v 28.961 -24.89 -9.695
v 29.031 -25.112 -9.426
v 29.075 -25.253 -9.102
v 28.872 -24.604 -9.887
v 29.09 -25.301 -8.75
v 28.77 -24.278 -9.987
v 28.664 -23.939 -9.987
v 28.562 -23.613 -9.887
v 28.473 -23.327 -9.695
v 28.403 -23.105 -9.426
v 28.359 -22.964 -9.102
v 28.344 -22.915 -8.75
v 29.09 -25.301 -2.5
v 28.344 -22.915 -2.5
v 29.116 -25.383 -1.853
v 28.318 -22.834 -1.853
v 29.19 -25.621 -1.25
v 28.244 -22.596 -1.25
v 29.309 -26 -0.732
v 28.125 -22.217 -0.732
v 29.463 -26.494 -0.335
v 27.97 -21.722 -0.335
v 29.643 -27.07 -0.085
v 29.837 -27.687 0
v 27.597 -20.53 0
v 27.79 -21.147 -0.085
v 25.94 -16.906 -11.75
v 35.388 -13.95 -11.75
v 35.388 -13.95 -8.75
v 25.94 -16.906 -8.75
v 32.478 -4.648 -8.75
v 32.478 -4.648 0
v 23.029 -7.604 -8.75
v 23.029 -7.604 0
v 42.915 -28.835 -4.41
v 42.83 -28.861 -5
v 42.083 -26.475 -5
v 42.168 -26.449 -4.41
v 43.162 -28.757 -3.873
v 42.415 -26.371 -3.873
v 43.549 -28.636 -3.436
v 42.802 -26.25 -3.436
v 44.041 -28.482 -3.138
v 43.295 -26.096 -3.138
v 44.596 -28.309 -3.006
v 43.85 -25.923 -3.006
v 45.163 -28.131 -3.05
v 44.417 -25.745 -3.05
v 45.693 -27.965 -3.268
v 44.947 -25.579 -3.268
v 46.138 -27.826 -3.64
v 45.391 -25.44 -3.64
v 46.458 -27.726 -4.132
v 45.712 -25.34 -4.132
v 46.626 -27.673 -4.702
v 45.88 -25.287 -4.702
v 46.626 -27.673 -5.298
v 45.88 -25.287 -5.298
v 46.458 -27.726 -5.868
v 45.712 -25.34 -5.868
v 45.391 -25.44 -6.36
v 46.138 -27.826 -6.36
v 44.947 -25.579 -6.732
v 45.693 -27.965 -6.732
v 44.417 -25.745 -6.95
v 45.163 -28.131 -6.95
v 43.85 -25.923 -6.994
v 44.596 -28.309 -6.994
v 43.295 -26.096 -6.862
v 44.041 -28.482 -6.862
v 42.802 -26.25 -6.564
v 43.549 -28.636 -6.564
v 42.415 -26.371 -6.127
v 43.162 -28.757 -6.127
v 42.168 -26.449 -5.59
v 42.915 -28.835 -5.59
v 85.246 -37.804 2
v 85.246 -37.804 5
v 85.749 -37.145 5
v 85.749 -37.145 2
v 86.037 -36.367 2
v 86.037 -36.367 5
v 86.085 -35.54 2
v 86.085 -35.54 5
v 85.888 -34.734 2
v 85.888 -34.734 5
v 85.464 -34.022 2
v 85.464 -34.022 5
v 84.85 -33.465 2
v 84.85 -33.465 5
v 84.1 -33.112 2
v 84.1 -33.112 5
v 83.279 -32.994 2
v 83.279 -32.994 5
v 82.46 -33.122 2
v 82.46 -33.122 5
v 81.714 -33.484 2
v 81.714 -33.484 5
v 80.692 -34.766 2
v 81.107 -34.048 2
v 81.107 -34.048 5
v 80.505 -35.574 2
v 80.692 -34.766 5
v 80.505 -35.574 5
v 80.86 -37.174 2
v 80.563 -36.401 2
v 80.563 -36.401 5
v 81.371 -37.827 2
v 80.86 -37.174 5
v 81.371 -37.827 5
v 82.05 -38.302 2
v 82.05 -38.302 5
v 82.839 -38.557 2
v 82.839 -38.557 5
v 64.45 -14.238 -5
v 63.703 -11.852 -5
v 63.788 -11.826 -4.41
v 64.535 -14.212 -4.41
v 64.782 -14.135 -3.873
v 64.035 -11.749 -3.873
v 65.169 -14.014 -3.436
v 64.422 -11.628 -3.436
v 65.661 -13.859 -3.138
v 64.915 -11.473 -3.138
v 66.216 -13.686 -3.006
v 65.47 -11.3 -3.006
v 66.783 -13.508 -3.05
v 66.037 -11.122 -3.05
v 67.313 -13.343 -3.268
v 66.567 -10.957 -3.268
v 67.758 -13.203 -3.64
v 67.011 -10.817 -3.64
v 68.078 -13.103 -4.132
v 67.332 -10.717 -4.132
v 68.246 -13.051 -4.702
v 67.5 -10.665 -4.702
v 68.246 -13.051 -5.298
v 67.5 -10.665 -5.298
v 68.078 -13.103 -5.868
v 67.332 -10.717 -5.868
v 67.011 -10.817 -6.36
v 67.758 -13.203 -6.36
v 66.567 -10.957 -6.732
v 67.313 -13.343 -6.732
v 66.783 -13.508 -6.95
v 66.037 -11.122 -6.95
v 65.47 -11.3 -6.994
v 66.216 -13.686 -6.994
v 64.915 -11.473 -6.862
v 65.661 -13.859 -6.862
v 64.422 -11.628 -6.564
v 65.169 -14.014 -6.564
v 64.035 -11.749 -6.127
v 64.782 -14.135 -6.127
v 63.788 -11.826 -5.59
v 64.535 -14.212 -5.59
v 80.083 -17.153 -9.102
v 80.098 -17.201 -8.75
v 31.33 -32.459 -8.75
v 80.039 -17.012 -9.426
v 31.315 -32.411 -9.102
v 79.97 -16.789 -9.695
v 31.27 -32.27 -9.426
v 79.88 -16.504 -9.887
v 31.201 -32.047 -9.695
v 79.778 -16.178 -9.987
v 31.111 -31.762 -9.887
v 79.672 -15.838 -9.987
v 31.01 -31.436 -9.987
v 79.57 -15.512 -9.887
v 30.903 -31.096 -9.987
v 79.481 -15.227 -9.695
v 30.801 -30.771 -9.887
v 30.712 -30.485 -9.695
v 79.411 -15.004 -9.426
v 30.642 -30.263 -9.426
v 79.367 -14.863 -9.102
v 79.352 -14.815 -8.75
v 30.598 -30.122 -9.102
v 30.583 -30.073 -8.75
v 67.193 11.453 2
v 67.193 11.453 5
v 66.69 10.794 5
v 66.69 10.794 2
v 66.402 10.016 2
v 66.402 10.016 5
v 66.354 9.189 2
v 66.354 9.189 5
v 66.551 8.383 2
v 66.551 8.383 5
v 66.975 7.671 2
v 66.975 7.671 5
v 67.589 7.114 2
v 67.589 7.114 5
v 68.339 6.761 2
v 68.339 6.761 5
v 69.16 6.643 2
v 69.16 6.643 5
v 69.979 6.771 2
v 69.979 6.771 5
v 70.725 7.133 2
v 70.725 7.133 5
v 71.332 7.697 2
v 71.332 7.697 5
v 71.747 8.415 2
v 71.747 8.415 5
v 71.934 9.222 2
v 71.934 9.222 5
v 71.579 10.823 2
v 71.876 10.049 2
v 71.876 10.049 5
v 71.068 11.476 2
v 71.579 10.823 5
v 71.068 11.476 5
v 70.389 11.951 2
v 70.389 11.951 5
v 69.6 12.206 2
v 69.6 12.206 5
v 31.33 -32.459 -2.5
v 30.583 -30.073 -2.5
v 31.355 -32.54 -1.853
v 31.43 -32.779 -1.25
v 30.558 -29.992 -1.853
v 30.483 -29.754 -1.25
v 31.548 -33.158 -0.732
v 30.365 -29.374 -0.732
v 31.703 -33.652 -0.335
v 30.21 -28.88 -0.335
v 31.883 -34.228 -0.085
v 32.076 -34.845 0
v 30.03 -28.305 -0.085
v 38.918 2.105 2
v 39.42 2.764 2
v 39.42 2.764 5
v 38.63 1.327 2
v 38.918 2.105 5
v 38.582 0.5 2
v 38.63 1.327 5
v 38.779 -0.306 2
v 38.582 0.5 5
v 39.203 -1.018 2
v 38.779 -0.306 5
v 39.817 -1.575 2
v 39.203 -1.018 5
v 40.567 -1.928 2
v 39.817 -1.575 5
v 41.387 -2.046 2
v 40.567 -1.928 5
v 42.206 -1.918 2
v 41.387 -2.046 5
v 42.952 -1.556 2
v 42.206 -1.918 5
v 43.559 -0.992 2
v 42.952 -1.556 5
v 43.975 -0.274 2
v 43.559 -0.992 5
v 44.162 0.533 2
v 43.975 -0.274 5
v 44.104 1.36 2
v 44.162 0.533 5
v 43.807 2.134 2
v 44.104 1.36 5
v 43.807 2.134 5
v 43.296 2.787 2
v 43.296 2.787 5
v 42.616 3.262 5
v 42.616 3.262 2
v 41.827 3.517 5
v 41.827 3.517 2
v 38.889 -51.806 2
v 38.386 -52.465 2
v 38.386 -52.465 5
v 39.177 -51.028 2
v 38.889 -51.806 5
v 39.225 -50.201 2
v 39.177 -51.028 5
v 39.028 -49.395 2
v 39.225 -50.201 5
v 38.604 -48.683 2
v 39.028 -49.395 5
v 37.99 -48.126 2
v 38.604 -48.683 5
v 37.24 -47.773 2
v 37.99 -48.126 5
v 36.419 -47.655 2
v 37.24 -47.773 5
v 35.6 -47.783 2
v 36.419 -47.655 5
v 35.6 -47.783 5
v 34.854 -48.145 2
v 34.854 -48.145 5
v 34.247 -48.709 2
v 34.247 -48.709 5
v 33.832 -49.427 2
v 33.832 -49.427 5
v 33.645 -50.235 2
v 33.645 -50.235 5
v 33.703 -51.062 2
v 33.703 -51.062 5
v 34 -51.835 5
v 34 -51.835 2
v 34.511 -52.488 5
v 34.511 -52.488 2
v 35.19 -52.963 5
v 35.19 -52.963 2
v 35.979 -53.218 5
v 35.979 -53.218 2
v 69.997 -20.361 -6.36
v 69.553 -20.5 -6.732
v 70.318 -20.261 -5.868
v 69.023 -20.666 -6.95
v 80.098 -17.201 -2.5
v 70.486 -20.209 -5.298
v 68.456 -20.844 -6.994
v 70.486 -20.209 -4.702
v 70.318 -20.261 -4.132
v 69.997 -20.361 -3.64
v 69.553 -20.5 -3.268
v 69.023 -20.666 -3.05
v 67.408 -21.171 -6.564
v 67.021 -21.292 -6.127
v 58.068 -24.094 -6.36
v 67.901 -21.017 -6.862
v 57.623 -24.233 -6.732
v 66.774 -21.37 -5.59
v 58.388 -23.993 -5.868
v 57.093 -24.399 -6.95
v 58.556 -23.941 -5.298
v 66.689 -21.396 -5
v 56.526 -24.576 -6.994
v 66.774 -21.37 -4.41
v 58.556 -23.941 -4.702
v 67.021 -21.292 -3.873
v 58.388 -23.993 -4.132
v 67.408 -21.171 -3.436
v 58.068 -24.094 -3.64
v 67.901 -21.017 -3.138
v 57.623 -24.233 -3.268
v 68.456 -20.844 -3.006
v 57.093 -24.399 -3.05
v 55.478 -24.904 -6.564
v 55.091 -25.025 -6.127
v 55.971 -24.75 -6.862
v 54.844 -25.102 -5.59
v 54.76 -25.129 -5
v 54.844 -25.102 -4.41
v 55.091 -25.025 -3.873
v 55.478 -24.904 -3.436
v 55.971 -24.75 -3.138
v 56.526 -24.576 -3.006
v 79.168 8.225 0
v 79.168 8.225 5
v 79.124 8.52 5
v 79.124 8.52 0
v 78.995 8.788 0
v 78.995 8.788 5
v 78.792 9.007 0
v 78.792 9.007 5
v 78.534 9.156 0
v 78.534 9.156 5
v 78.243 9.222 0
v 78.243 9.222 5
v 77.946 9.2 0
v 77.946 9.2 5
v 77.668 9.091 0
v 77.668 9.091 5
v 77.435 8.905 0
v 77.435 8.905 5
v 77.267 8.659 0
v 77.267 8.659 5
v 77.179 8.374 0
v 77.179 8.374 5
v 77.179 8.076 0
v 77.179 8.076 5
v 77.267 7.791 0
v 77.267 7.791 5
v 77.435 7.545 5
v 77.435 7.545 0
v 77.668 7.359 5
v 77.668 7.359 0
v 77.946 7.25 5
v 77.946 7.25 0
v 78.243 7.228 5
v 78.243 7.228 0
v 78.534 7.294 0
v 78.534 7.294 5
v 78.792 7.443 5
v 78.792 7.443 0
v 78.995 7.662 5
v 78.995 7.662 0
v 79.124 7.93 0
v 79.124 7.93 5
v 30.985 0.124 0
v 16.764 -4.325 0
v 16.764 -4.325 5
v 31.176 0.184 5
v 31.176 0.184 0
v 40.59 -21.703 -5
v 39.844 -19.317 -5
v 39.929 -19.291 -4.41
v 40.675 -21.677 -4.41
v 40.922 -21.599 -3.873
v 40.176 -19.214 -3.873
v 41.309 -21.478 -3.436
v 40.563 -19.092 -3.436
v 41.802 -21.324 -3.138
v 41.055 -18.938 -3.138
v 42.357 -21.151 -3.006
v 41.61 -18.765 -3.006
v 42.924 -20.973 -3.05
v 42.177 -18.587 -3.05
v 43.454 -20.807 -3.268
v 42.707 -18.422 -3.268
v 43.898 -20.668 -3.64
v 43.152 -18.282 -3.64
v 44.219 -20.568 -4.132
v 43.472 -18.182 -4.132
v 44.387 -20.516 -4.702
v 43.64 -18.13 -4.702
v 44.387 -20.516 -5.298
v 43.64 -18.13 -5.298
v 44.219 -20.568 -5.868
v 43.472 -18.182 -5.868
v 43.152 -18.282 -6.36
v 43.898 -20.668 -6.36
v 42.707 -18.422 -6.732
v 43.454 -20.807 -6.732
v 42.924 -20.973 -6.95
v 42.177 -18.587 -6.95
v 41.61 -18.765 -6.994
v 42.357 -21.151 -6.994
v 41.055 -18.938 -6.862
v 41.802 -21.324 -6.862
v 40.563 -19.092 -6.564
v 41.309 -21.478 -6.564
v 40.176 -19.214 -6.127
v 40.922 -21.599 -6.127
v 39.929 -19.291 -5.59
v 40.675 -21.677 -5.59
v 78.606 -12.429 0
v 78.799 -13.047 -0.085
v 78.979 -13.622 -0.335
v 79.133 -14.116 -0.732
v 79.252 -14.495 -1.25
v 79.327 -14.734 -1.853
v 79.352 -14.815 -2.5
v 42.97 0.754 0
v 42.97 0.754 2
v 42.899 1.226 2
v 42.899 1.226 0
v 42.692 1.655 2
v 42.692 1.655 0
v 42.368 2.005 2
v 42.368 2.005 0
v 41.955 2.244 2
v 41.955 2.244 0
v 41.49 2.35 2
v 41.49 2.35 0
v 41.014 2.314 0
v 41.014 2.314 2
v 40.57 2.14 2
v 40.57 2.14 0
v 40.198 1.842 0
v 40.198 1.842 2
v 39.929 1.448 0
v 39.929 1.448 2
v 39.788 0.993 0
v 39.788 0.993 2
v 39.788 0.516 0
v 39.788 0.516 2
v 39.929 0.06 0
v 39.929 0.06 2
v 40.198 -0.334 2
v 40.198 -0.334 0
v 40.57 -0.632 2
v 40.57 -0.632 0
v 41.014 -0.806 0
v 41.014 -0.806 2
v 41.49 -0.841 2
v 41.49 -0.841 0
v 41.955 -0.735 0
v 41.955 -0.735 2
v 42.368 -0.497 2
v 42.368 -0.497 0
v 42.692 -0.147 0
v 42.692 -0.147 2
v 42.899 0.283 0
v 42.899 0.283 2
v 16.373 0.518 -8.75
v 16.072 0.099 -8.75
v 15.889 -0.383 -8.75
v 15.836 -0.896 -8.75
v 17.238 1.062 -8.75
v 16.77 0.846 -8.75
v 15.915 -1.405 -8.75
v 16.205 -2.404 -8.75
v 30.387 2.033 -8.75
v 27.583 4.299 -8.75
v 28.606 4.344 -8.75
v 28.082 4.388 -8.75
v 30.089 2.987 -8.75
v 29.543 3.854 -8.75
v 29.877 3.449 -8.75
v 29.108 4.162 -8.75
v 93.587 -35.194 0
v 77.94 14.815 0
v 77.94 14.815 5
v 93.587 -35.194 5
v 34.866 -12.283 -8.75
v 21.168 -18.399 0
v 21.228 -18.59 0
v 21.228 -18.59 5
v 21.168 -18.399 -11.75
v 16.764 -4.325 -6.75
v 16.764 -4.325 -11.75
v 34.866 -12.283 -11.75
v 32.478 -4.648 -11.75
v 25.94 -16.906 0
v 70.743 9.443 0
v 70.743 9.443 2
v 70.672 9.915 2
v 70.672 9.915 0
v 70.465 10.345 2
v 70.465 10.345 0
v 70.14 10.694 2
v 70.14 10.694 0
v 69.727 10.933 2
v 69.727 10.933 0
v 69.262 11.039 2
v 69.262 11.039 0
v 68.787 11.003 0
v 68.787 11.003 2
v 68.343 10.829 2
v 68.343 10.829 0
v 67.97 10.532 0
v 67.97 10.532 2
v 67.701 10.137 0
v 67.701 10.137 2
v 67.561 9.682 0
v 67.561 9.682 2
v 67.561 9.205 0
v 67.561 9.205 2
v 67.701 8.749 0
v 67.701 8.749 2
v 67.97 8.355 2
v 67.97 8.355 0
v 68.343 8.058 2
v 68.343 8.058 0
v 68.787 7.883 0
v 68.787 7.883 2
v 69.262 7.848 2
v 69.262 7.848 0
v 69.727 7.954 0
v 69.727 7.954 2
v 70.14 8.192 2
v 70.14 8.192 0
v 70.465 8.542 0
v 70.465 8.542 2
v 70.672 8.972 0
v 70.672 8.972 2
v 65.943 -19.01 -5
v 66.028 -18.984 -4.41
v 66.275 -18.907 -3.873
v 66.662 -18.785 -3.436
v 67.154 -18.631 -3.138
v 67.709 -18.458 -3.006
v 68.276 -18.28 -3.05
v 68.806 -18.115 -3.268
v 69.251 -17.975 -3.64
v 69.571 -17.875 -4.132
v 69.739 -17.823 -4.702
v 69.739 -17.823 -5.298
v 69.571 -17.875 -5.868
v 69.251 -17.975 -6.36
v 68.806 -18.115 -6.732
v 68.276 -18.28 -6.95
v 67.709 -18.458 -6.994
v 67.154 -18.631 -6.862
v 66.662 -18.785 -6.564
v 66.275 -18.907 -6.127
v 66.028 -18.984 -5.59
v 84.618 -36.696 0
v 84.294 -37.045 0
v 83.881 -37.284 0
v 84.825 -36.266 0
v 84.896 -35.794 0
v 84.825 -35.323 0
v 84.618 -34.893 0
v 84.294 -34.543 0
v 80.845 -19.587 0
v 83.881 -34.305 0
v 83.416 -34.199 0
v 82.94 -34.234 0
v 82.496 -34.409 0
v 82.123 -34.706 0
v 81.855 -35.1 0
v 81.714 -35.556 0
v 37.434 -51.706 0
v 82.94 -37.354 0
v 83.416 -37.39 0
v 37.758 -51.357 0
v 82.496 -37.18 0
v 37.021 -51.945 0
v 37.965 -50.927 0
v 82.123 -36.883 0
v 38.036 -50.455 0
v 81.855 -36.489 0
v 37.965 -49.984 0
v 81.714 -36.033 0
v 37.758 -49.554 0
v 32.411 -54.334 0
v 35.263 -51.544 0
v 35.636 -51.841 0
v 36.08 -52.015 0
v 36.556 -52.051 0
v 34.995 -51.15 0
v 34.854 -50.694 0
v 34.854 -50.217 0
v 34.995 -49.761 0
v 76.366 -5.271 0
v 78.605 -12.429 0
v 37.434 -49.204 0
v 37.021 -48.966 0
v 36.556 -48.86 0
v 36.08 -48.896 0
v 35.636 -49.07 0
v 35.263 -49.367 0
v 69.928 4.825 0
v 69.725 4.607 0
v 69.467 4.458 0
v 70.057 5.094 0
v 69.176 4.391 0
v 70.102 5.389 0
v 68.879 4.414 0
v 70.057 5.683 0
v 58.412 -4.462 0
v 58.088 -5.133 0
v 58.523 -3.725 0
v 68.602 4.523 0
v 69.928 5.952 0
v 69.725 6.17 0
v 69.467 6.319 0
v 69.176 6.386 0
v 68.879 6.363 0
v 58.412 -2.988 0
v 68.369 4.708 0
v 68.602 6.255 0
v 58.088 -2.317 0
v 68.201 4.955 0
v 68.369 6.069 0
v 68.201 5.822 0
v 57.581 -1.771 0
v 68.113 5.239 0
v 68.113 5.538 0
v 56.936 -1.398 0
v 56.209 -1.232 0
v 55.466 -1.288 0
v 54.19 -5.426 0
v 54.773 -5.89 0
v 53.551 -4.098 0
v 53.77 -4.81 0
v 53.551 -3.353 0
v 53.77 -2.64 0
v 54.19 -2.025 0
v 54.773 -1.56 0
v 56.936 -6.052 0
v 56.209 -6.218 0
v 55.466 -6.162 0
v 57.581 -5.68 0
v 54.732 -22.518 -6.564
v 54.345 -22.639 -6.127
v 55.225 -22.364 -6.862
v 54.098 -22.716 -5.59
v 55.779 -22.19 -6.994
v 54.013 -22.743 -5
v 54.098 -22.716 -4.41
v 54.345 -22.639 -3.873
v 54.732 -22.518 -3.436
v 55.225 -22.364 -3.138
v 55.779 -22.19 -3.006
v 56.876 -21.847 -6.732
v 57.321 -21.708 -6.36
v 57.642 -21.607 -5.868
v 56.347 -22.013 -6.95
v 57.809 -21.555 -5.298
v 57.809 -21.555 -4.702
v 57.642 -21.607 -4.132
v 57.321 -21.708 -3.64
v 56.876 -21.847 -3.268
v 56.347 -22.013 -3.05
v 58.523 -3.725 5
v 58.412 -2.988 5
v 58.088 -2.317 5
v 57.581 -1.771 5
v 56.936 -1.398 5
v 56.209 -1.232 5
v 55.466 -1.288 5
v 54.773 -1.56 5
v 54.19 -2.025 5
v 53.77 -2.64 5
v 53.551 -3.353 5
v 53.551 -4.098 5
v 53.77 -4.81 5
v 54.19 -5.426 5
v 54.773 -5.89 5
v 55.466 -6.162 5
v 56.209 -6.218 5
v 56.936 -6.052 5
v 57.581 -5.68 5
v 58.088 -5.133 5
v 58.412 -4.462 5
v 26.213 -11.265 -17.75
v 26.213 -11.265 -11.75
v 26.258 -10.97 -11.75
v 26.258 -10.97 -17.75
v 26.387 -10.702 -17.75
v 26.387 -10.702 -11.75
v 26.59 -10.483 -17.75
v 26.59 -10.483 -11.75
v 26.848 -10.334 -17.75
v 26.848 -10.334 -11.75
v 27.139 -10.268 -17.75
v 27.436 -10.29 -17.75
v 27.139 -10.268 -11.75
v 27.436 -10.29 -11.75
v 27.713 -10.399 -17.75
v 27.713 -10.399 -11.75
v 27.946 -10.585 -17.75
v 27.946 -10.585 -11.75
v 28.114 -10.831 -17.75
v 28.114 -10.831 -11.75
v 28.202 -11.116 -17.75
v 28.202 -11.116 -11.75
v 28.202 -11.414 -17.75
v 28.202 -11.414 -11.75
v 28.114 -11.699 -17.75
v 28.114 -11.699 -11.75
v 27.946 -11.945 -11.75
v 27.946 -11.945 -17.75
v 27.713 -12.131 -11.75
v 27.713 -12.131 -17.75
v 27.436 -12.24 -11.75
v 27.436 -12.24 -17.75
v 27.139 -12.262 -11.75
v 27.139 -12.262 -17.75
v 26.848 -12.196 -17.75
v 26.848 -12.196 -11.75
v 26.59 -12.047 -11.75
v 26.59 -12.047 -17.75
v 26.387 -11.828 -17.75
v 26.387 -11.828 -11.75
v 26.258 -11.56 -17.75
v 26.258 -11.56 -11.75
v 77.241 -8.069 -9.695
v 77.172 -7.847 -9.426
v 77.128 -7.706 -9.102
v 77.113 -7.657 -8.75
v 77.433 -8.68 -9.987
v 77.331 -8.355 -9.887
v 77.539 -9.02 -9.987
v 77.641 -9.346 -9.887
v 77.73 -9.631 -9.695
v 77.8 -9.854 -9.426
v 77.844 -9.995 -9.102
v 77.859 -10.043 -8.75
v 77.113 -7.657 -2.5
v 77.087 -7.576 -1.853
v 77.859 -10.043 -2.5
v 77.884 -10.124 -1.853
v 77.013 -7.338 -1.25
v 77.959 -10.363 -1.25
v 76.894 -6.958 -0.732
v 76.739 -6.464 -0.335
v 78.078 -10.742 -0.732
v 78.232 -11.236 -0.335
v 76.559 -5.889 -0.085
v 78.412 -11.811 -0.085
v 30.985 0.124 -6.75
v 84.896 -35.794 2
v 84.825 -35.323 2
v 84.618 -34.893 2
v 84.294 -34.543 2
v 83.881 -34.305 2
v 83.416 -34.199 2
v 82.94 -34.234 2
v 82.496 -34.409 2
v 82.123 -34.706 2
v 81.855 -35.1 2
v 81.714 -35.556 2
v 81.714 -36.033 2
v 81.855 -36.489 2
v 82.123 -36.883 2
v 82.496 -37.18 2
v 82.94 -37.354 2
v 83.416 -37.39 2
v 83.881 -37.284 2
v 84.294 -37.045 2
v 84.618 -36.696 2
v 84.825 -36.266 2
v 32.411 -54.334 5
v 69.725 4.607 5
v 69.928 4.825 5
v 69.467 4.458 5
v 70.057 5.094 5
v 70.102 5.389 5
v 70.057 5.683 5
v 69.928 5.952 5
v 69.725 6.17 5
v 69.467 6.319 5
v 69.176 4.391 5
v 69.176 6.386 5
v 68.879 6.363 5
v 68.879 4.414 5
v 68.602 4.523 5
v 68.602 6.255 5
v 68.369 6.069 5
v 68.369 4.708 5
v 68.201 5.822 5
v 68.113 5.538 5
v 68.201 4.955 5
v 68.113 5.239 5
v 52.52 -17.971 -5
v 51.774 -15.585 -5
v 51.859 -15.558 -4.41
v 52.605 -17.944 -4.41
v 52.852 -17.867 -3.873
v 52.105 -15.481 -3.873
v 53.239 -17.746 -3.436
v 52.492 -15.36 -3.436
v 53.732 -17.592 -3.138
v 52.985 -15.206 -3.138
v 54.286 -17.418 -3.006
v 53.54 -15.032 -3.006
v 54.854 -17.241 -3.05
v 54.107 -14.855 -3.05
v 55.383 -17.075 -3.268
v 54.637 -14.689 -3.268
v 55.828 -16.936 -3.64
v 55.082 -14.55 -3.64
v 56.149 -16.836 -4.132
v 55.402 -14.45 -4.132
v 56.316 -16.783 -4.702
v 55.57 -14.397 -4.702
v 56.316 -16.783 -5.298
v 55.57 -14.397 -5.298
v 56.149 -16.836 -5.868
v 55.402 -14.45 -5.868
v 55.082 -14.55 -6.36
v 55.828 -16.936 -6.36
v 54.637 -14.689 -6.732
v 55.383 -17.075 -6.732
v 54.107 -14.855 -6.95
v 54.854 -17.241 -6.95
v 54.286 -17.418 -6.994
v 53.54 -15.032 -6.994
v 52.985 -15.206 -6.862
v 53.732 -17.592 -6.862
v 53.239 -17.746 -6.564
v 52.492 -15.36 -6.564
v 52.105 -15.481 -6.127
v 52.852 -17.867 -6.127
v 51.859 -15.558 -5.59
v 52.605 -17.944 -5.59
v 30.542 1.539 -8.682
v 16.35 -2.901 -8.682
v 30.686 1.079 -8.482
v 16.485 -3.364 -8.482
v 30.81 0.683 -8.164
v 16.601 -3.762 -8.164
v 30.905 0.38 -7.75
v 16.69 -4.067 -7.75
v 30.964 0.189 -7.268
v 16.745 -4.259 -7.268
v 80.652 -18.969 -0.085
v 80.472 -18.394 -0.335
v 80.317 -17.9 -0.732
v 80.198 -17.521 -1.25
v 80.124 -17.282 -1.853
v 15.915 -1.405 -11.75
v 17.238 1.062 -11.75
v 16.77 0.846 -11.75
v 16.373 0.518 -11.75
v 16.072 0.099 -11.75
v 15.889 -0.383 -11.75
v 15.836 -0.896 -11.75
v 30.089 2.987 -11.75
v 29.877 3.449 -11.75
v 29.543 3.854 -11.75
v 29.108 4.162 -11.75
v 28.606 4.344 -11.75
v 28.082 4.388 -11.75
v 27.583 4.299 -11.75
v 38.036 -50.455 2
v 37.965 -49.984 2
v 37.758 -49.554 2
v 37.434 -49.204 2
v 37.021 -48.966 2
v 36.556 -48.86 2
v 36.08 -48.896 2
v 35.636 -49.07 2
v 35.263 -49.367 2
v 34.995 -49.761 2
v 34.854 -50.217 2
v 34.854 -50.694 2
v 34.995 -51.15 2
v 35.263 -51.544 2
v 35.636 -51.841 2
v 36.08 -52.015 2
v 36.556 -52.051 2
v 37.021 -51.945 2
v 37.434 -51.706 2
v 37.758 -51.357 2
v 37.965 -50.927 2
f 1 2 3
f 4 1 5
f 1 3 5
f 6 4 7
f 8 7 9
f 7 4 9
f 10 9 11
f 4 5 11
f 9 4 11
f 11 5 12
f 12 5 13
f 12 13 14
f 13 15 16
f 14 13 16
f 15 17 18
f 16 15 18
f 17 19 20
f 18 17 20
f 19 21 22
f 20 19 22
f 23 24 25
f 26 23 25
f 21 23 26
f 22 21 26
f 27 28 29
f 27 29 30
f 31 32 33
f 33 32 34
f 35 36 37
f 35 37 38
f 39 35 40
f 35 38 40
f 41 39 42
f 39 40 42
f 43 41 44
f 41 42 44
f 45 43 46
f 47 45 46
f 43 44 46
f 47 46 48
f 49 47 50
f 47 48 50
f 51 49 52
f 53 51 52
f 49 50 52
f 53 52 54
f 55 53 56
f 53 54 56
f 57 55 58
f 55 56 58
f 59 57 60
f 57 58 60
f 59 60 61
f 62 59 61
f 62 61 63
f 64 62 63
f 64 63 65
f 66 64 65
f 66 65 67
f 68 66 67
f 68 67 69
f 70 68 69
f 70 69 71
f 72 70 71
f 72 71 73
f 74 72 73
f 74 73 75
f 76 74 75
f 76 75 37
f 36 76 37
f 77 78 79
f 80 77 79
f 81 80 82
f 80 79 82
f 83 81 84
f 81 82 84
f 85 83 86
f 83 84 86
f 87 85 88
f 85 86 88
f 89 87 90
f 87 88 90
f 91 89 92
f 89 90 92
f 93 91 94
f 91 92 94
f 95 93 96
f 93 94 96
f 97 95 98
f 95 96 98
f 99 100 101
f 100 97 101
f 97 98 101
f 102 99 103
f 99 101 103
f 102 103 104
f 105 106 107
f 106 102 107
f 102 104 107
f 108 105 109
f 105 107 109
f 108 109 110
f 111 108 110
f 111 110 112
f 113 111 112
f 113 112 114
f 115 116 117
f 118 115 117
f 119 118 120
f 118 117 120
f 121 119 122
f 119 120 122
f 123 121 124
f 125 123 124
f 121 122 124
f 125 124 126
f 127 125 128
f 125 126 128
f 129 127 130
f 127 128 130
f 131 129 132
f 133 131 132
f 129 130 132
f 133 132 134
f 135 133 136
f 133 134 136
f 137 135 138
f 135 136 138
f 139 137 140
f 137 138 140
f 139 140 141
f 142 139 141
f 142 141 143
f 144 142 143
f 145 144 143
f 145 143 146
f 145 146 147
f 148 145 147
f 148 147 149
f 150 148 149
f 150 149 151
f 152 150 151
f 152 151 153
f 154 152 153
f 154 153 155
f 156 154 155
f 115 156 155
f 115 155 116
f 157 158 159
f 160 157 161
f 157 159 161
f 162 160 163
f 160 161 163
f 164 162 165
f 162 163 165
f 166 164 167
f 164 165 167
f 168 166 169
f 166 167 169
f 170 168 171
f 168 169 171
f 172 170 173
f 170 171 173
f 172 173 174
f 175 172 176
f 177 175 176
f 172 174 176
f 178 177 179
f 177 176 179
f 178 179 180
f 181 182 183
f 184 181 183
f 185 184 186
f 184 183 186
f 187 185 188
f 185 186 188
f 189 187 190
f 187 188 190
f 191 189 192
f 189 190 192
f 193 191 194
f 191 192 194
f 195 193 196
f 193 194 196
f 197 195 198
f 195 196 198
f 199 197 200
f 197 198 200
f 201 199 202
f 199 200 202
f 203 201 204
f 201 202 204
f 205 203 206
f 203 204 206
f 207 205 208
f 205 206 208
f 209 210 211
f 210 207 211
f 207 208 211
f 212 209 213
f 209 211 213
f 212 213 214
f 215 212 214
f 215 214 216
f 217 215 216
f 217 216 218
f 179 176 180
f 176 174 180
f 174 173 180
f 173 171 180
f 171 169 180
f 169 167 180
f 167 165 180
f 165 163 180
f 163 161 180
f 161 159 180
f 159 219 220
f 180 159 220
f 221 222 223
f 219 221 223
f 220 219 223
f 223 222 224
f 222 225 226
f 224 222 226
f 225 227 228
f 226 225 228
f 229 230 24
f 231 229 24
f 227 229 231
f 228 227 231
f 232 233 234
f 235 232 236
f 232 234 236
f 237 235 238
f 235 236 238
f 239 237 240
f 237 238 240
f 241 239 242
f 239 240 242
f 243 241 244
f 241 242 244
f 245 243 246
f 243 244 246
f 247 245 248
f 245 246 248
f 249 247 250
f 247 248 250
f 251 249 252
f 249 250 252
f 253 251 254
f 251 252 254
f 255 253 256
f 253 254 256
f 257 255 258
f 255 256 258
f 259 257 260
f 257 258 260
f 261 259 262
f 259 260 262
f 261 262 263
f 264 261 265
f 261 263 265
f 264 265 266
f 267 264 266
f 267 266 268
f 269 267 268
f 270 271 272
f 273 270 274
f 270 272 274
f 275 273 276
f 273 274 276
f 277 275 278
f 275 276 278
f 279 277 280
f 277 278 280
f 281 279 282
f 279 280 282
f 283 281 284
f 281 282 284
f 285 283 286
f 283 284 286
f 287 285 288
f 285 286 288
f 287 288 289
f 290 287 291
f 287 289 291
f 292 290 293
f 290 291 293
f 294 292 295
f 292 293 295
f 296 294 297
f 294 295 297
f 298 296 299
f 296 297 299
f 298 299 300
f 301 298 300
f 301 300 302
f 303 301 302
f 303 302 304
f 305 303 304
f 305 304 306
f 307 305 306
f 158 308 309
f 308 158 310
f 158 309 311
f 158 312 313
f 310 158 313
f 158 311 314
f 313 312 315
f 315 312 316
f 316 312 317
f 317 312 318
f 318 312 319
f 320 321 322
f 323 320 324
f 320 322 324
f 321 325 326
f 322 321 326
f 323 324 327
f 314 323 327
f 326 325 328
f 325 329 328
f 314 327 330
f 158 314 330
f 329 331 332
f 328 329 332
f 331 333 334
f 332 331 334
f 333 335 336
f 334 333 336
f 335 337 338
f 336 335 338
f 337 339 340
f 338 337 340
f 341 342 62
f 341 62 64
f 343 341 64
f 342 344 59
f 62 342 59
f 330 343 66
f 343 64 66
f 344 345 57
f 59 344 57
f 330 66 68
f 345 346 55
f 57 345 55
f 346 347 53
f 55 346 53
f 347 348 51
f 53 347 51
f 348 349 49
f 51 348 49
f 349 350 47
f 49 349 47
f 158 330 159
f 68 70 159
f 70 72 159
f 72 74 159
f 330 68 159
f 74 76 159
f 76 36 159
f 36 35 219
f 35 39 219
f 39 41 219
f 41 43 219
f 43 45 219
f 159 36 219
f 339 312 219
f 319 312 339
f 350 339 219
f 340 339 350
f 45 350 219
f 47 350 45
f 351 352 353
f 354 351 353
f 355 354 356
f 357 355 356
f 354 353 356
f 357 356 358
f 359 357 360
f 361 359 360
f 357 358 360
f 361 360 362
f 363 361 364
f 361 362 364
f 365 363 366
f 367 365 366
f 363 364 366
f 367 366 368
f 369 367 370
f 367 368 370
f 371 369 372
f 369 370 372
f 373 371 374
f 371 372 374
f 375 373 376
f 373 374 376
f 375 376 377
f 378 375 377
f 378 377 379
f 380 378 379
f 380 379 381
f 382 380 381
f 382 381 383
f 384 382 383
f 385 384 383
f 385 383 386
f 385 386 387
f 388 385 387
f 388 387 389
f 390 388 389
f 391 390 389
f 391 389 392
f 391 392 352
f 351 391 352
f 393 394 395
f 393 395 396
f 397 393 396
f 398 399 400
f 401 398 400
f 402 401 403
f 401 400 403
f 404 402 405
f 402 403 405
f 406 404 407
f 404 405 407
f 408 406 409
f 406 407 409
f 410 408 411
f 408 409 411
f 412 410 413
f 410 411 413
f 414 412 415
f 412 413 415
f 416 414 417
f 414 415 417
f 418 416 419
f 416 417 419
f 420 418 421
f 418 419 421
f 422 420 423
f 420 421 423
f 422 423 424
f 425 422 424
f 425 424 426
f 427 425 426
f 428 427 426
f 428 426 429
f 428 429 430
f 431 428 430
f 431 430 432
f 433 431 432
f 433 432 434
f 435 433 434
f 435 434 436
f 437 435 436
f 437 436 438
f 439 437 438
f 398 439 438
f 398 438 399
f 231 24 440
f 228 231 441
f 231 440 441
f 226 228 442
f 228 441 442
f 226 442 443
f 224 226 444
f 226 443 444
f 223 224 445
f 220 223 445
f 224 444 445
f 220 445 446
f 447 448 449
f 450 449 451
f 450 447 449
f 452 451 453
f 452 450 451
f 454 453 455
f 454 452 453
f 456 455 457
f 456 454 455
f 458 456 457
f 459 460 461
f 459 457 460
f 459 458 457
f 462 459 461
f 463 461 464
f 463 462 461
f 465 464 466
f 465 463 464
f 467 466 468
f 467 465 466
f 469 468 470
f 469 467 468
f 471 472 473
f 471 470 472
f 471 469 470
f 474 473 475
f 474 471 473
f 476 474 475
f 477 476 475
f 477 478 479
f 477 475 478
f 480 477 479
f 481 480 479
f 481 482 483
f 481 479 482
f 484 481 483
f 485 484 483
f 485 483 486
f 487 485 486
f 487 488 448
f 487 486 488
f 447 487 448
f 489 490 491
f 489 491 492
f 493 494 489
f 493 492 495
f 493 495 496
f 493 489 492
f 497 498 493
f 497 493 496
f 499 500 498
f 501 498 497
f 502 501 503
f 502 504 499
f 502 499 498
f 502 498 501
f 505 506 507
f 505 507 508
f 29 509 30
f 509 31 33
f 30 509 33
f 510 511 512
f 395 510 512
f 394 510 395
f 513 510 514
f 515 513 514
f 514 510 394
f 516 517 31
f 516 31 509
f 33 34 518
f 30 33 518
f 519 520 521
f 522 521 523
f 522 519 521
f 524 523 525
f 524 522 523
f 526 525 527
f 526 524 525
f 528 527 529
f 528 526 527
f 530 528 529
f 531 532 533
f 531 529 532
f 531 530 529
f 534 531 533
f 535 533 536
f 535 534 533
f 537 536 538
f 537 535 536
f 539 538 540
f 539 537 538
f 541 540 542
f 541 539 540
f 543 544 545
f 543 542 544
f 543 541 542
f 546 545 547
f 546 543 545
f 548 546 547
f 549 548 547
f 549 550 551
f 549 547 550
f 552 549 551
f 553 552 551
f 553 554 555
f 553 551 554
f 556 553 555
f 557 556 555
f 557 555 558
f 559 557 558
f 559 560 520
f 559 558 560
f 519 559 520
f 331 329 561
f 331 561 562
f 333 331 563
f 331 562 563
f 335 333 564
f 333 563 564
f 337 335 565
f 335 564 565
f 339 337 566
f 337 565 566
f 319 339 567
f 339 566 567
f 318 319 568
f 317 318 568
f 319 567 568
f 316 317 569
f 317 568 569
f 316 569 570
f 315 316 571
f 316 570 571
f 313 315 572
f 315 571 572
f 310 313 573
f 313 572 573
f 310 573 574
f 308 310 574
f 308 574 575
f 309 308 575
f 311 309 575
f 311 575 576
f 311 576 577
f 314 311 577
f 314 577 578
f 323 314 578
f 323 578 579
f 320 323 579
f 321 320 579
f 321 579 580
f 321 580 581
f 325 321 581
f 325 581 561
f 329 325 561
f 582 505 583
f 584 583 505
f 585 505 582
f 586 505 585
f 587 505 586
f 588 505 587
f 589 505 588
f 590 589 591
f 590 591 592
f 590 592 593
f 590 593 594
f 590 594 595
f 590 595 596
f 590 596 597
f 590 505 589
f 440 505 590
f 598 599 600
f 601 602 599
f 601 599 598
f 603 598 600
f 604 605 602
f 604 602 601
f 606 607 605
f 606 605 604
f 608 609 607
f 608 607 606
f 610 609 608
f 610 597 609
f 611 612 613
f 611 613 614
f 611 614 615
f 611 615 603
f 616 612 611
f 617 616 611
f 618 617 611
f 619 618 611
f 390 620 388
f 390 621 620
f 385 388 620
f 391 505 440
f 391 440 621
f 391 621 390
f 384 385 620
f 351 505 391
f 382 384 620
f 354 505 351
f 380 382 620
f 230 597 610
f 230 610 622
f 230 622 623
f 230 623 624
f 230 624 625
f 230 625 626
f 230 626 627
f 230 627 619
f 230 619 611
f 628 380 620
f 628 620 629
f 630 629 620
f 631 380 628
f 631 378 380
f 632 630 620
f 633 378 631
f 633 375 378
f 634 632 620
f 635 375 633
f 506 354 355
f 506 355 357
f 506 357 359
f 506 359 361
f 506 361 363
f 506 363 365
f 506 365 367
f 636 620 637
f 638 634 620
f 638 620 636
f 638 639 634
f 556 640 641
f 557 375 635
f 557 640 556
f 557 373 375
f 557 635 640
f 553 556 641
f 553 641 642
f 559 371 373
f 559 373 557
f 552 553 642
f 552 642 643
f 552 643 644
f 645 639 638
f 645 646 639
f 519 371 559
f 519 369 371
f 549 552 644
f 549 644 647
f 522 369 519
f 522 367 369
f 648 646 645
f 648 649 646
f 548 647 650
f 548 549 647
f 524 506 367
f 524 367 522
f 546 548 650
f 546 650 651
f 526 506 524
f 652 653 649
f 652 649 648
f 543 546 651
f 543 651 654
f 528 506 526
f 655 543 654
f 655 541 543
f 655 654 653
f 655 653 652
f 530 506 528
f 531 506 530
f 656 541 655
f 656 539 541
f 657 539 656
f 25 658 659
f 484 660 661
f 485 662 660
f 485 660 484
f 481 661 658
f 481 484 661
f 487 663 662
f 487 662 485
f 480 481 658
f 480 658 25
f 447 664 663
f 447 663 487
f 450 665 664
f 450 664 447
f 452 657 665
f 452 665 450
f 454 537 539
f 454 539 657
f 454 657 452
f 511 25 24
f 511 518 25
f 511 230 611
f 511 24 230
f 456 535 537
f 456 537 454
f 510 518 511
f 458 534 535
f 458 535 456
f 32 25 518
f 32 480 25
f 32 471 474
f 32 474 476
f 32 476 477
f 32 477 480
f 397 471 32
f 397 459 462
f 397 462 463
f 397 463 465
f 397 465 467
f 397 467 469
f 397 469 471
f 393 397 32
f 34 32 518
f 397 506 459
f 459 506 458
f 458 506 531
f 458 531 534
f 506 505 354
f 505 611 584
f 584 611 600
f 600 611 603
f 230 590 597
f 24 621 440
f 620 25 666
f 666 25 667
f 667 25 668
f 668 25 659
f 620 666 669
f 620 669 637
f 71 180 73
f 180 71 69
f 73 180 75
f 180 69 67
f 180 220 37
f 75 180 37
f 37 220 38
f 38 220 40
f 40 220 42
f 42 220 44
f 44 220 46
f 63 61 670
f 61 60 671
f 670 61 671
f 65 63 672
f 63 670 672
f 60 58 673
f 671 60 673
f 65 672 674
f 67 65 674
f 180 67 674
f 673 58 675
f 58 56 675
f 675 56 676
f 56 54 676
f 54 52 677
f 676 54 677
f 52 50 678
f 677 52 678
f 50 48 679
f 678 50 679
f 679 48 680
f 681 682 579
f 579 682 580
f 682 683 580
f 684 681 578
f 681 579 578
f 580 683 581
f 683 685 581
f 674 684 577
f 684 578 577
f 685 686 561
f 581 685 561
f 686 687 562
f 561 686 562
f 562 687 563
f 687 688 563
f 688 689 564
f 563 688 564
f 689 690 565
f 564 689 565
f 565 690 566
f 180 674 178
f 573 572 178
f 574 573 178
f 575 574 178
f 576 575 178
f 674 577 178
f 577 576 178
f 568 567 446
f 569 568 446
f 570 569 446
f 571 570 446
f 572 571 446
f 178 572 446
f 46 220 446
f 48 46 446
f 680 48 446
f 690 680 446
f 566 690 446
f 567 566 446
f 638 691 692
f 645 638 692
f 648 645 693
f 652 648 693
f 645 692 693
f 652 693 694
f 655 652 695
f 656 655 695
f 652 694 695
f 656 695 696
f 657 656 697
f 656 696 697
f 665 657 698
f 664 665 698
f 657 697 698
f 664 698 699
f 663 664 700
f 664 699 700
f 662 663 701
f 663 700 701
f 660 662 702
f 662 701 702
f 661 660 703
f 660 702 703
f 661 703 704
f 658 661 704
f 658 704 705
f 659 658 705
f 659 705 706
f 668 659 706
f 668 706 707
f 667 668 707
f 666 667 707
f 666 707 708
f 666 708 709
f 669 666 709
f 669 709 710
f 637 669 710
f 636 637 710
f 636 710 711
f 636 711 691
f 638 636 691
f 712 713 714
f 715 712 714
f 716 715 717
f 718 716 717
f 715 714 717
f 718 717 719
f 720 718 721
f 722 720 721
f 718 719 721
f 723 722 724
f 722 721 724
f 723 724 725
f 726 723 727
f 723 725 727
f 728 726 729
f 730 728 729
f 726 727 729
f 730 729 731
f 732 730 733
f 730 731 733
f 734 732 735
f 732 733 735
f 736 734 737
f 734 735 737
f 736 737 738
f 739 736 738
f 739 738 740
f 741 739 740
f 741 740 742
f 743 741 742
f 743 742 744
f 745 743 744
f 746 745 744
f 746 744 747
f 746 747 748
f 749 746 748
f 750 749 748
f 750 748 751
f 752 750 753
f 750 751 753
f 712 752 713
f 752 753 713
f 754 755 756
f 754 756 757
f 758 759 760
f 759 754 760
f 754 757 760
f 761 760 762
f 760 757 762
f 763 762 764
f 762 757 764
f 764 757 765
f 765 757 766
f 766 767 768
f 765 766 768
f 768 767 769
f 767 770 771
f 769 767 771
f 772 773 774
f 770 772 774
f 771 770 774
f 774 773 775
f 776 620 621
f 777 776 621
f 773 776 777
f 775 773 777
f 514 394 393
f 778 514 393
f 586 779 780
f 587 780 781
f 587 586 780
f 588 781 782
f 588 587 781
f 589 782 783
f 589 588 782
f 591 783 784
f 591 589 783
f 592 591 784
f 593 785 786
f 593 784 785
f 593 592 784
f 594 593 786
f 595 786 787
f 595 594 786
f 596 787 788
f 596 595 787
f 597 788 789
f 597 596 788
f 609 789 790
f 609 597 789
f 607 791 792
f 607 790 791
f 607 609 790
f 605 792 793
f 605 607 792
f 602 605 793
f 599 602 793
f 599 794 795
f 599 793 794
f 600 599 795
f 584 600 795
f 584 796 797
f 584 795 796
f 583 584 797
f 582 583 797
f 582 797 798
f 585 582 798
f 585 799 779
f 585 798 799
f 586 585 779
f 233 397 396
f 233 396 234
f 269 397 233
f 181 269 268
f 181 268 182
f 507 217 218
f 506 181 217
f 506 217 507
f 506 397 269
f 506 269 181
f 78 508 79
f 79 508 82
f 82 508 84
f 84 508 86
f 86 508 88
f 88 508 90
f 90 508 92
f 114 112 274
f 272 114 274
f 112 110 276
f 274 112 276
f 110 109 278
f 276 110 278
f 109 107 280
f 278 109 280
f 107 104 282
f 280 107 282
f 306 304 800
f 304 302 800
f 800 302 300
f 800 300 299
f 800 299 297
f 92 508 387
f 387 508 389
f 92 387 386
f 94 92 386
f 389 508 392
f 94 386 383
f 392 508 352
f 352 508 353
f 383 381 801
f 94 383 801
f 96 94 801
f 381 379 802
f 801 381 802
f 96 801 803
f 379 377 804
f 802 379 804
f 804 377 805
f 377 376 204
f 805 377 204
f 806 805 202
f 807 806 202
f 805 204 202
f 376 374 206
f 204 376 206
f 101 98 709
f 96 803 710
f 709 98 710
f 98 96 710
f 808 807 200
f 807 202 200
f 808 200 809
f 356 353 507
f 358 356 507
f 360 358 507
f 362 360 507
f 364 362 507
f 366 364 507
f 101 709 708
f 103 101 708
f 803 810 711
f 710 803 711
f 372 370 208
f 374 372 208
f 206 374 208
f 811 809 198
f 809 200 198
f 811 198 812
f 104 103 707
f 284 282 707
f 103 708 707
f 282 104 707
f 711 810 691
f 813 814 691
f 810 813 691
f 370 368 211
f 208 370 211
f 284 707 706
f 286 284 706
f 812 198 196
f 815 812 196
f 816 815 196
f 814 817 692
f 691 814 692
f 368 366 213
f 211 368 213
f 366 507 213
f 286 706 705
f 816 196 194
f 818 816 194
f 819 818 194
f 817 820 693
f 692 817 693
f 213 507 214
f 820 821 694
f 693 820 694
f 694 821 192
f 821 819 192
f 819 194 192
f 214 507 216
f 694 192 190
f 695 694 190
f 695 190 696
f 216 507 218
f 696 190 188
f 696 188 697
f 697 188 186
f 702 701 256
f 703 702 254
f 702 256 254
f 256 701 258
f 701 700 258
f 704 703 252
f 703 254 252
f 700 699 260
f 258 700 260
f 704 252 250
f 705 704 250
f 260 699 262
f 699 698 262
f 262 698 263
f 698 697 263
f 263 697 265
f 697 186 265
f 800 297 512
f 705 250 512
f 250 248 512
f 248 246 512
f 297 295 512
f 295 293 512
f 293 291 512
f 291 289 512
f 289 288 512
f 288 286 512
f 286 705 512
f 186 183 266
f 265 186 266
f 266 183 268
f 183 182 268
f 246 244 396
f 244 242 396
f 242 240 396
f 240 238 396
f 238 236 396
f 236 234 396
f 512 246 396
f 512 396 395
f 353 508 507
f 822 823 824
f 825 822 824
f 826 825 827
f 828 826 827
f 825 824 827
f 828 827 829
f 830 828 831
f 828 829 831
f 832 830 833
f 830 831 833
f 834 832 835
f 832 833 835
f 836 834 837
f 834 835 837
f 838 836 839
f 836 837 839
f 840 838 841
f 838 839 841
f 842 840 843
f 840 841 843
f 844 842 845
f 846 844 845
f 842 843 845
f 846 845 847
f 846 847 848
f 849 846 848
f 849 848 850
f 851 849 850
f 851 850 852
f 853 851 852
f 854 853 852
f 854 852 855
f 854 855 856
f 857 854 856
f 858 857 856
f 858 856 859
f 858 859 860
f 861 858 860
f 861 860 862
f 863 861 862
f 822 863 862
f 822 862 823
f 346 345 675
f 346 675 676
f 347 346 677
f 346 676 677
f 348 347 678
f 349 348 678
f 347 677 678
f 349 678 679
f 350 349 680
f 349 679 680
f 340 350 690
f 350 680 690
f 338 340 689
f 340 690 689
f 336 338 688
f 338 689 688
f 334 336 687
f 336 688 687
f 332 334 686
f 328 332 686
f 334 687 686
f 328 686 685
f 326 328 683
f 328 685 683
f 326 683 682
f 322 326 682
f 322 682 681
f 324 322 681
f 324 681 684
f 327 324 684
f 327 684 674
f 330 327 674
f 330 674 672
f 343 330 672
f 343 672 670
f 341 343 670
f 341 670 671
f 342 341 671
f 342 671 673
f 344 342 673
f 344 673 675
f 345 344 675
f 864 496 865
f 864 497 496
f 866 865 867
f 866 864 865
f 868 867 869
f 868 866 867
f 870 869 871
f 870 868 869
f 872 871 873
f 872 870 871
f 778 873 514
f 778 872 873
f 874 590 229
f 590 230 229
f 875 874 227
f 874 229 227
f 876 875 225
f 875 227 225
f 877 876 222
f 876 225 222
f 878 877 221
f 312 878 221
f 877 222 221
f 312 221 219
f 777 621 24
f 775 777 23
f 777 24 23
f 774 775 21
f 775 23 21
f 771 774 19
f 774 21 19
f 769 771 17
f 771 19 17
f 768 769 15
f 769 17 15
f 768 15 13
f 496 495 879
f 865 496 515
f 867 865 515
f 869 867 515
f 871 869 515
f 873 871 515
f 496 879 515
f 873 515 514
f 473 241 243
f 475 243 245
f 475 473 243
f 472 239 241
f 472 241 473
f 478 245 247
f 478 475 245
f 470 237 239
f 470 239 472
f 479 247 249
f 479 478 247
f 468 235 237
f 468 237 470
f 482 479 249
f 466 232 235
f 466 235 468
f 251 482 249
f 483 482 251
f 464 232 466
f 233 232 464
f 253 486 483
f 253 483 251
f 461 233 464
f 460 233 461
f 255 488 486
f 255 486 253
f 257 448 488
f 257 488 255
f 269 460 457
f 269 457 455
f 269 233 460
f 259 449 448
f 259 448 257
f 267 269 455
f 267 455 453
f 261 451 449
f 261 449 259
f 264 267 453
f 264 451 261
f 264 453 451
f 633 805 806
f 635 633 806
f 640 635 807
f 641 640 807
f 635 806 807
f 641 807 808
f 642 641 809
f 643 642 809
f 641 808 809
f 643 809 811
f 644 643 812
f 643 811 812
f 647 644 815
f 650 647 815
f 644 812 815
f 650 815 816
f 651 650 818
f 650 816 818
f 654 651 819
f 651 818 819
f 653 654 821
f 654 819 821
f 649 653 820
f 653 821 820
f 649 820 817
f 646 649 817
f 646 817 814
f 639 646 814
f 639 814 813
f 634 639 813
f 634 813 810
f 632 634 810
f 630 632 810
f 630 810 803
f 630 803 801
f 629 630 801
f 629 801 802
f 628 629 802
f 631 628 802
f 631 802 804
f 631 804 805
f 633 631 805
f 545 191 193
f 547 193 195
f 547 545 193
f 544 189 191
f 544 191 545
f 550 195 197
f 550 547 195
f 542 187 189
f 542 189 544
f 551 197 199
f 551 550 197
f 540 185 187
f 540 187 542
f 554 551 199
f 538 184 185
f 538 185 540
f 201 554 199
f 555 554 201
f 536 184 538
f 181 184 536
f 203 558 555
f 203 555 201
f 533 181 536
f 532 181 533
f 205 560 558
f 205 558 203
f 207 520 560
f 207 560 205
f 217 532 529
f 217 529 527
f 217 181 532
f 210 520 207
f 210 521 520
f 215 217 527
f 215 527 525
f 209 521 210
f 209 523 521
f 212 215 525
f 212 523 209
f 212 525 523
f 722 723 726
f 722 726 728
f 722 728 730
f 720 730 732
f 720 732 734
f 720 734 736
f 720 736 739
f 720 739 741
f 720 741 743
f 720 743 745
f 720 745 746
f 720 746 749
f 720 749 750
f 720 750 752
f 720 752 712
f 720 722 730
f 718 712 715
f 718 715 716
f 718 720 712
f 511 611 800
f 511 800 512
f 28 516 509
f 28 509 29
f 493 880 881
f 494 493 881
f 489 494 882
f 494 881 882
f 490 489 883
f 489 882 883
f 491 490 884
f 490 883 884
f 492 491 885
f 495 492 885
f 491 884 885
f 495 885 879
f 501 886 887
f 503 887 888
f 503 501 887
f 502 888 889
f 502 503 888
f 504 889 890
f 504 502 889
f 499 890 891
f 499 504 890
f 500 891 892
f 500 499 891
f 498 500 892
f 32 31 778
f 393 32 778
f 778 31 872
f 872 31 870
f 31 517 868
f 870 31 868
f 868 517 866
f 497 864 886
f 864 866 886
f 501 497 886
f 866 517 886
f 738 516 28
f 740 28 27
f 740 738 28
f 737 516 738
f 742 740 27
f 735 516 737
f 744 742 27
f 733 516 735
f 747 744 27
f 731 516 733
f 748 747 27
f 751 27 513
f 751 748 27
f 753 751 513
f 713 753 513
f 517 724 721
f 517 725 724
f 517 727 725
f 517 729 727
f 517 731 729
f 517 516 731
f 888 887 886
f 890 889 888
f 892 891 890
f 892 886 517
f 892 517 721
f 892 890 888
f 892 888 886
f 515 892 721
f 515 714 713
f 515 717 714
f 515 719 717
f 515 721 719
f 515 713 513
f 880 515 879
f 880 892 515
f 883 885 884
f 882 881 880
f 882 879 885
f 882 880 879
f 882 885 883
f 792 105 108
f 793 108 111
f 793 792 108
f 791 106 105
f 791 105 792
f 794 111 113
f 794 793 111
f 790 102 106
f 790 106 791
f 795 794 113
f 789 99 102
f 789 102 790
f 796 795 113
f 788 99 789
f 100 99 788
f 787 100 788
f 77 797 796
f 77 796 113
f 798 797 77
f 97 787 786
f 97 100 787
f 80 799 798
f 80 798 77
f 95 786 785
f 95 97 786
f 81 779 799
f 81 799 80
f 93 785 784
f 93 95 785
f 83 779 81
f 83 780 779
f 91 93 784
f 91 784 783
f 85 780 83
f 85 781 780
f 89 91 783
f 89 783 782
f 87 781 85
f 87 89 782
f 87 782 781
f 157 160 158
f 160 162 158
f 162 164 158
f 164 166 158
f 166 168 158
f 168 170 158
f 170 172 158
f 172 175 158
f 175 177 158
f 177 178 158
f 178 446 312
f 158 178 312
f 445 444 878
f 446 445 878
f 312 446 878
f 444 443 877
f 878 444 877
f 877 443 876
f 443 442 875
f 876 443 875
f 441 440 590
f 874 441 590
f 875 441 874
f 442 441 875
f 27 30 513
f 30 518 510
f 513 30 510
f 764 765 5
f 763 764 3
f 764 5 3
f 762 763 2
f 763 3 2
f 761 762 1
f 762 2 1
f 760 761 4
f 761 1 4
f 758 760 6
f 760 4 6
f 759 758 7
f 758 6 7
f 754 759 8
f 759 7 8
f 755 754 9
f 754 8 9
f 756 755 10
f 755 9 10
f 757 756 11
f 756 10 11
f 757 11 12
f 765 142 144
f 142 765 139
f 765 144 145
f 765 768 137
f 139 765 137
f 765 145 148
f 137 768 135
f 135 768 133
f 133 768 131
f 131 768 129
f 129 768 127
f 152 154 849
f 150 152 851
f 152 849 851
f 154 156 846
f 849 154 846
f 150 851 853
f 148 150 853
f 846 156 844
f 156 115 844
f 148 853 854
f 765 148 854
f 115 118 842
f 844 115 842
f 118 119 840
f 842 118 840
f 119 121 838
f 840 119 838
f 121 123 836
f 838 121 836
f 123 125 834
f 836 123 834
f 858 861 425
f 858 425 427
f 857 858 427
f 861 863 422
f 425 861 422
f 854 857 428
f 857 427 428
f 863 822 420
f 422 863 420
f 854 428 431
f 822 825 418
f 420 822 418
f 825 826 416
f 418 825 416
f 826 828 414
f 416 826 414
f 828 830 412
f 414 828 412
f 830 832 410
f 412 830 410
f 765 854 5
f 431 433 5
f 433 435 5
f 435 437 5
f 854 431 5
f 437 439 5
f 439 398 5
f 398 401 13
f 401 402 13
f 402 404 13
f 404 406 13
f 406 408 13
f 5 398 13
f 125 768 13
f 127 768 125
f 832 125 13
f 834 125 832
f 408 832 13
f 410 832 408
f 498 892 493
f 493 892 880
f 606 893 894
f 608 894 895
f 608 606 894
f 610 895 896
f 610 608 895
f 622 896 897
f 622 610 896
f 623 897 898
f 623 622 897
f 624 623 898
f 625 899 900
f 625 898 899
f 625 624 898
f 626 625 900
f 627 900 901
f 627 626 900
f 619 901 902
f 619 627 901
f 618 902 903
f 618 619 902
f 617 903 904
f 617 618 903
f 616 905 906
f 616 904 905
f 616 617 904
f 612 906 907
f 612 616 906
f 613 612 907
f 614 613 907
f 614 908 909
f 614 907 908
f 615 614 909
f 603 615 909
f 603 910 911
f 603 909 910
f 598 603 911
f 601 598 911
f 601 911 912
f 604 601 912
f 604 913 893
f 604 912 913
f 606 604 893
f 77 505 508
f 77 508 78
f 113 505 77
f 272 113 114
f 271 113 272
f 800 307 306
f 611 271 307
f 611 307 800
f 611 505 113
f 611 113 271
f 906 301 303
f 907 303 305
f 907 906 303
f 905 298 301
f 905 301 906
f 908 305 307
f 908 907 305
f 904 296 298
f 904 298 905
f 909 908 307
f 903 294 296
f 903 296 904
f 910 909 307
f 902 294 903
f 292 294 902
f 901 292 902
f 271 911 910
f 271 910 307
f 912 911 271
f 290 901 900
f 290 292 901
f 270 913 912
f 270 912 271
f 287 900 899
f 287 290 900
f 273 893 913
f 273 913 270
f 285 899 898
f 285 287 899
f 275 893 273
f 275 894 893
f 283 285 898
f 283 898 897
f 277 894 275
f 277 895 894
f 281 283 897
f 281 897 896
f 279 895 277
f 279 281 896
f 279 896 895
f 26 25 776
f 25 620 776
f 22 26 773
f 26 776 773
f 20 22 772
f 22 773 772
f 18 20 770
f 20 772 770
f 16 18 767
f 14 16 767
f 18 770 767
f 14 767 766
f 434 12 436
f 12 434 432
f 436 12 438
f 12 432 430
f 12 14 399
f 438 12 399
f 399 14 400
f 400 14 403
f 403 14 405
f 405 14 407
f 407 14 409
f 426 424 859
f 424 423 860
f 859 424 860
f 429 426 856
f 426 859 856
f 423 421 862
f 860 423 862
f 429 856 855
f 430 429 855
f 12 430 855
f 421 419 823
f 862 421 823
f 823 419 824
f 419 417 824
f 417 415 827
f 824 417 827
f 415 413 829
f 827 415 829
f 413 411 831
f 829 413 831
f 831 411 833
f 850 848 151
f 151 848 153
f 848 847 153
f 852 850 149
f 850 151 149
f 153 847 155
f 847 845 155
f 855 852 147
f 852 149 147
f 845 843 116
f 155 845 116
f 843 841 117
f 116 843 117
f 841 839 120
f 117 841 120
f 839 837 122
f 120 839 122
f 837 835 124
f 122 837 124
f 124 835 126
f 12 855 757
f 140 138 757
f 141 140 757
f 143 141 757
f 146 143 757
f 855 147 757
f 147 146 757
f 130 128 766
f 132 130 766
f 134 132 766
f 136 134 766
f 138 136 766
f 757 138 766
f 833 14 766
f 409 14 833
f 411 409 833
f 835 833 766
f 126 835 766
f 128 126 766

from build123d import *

# Parameters (mm, degrees)
BOSS_EXTRUDE1_DEPTH    = 5
BOSS_EXTRUDE3_DEPTH    = 11.75
BOSS_EXTRUDE5_DEPTH    = 3
FILLET1_R              = 2
BOSS_EXTRUDE6_DEPTH    = 10
SKETCH7_R              = 2
CUT_EXTRUDE1_DEPTH     = 96.909253568
BOSS_EXTRUDE8_DEPTH    = 3
FILLET4_R              = 2.5
FILLET5_R              = 1.25
CUT_EXTRUDE2_OUTLINE_R = 1.6
CUT_EXTRUDE2_DEPTH     = 5
SKETCH10_R             = 2.5
CUT_EXTRUDE3_DEPTH     = 110.504432364
SKETCH4_R              = 1
BOSS_EXTRUDE4_DEPTH    = 6
SKETCH12_R             = 2.8
CUT_EXTRUDE4_DEPTH     = 3
SKETCH9_R              = 1
CUT_EXTRUDE5_DEPTH     = 111.58128552


# Read off the part's stored shape, not the designer's step: Cut-Extrude2
# Some blends are built 0.0001 mm under size
with BuildPart() as part:
    # Sketch1 → Boss-Extrude1 (new body)
    with BuildSketch(Plane.XY):
        Polygon((21.227605409, -18.590227349), (16.764409011, -4.324804639), (31.175545422, 0.183980935), (77.940160264, 14.815139421), (93.586541992, -35.194367063), (32.410790739, -54.334311124), align=None)
    extrude(amount=BOSS_EXTRUDE1_DEPTH)

    # Sketch3 → Boss-Extrude3 (add)
    with BuildSketch(Plane(origin=(0, 0, 0), x_dir=(-1, 0, 0), z_dir=(0, 0, -1))):
        Polygon((-30.984669443, 0.124261921), (-32.477644799, -4.647637553), (-23.029283841, -7.603728757), (-25.939785869, -16.906376014), (-21.167886395, -18.39935137), (-16.764409011, -4.324804639), align=None)
    extrude(amount=BOSS_EXTRUDE3_DEPTH)

    # Sketch5 → Boss-Extrude5 (add)
    with BuildSketch(Plane(origin=(0, 0, -11.75), x_dir=(-1, 0, 0), z_dir=(0, 0, -1))):
        with BuildLine():
            Line((-30.984669443, 0.124261921), (-29.491694087, 4.896161395))
            Line((-29.491694087, 4.896161395), (-27.773810277, 4.358690267))
            Line((-27.773810277, 4.358690267), (-17.237837952, 1.062320107))
            ThreePointArc((-17.237837952, 1.062320107), (-16.072415286, 0.098650836), (-15.914708528, -1.405342859))
            Line((-15.914708528, -1.405342859), (-16.764409011, -4.324804639))
            Line((-16.764409011, -4.324804639), (-30.984669443, 0.124261921))
        make_face()
    extrude(amount=-BOSS_EXTRUDE5_DEPTH)

    # Fillet1
    fillet1_edges = [part.edges().sort_by_distance(p)[0] for p in [
        (23.874539227, -2.100271359, -8.75),
        (29.491694087, 4.896161395, -10.25),
    ]]
    fillet(fillet1_edges, radius=FILLET1_R)

    # Sketch6 → Boss-Extrude6 (add)
    with BuildSketch(Plane(origin=(0, 0, 0), x_dir=(-1, 0, 0), z_dir=(0, 0, -1))):
        Polygon((-77.85901424, -10.043127118), (-29.090201618, -25.301335253), (-28.34371394, -22.915385516), (-77.112526562, -7.657177381), align=None)
        Polygon((-79.351989595, -14.815026591), (-80.098477273, -17.200976328), (-31.329664652, -32.459184464), (-30.583176974, -30.073234727), align=None)
    extrude(amount=BOSS_EXTRUDE6_DEPTH)

    # Sketch7 → Cut-Extrude1 (cut, through all)
    with BuildSketch(Plane(origin=(9.057366854, -28.949469231, 0), x_dir=(0.9543798947428422, 0.29859507114257827, 0), z_dir=(-0.2985950711425783, 0.9543798947428423, 0))):
        with Locations(Location((46.758249559, 5, 0), (0, 0, 180))):
            Circle(SKETCH7_R)
        with Locations(Location((59.258249559, 5, 0), (0, 0, 180))):
            Circle(SKETCH7_R)
        with Locations(Location((34.258249559, 5, 0), (0, 0, 180))):
            Circle(SKETCH7_R)
    extrude(amount=-CUT_EXTRUDE1_DEPTH, mode=Mode.SUBTRACT)

    # Sketch11 → Boss-Extrude8 (add)
    with BuildSketch(Plane(origin=(0, 0, -11.75), x_dir=(-1, 0, 0), z_dir=(0, 0, -1))):
        Polygon((-32.477644799, -4.647637553), (-34.866405368, -12.282676711), (-35.388146827, -13.95028481), (-25.939785869, -16.906376014), (-23.029283841, -7.603728757), align=None)
    extrude(amount=-BOSS_EXTRUDE8_DEPTH)

    # Fillet4
    fillet4_edges = [part.edges().sort_by_distance(p)[0] for p in [
        (52.728120251, -15.286281449, 0),
        (53.474607929, -17.672231185, 0),
        (54.967583285, -22.444130659, 0),
        (55.714070963, -24.830080396, 0),
    ]]
    fillet(fillet4_edges, radius=FILLET4_R - 0.0001)  # a hair under: the kernel refuses the full size

    # Fillet5
    # the kernel refuses this fillet: 1.25 mm, written as the material it takes off along each edge
    with BuildSketch(Plane(origin=(83.080914444, -16.267866731, -10), x_dir=(0, 0, 1), z_dir=(-0.9543798947428422, -0.2985950711425782, 0)), Plane(origin=(27.600739803, -31.006344324, -10), x_dir=(0, 0, 1), z_dir=(0.9543798947428423, 0.2985950711425782, 0)), Plane(origin=(25.361276769, -23.848495114, -10), x_dir=(0, 0, 1), z_dir=(0.9543798947428422, 0.2985950711425783, 0)), Plane(origin=(80.841451411, -9.11001752, -10), x_dir=(0, 0, 1), z_dir=(-0.9543798947428422, -0.2985950711425783, 0))) as fillet5_piece_1:
        with BuildLine():
            CenterArc((FILLET5_R, FILLET5_R), FILLET5_R, 180, 90)
            Line((0, FILLET5_R), (0, 0))
            Line((0, 0), (FILLET5_R, 0))
        make_face()
    extrude(amount=57.35, mode=Mode.SUBTRACT)

    # Cut-Extrude2 outline → Cut-Extrude2 (cut)
    with BuildSketch(Plane.XY):
        with Locations((69.142848995, 9.443238973)):
            Circle(CUT_EXTRUDE2_OUTLINE_R)
        with Locations((36.436202535, -50.455386031)):
            Circle(CUT_EXTRUDE2_OUTLINE_R)
        with Locations((41.370394058, 0.754122403)):
            Circle(CUT_EXTRUDE2_OUTLINE_R)
        with Locations((83.296255367, -35.794368038)):
            Circle(CUT_EXTRUDE2_OUTLINE_R)
    extrude(amount=CUT_EXTRUDE2_DEPTH, mode=Mode.SUBTRACT)

    # Sketch10 → Cut-Extrude3 (cut, through all)
    with BuildSketch(Plane.XY.offset(5)):
        with Locations((56.022602403, -3.725145057)):
            Circle(SKETCH10_R)
    extrude(amount=-CUT_EXTRUDE3_DEPTH, mode=Mode.SUBTRACT)

    # Sketch4 → Boss-Extrude4 (add)
    with BuildSketch(Plane(origin=(0, 0, -11.75), x_dir=(-1, 0, 0), z_dir=(0, 0, -1))):
        with Locations((-27.213433721, -11.264996593)):
            Circle(SKETCH4_R)
    extrude(amount=BOSS_EXTRUDE4_DEPTH)

    # Sketch12 → Cut-Extrude4 (cut)
    with BuildSketch(Plane.XY.offset(5)):
        with Locations((69.142848995, 9.443238973)):
            Circle(SKETCH12_R)
        with Locations((41.370394058, 0.754122403)):
            Circle(SKETCH12_R)
        with Locations((36.436202535, -50.455386031)):
            Circle(SKETCH12_R)
        with Locations((83.296255367, -35.794368038)):
            Circle(SKETCH12_R)
    extrude(amount=-CUT_EXTRUDE4_DEPTH, mode=Mode.SUBTRACT)

    # Sketch9 → Cut-Extrude5 (cut, through all)
    with BuildSketch(Plane.XY.offset(5)):
        with Locations((78.168297598, 8.225179053)):
            Circle(SKETCH9_R)
        with Locations((69.101688598, 5.388525877)):
            Circle(SKETCH9_R)
    extrude(amount=-CUT_EXTRUDE5_DEPTH, mode=Mode.SUBTRACT)


solid = part.part
